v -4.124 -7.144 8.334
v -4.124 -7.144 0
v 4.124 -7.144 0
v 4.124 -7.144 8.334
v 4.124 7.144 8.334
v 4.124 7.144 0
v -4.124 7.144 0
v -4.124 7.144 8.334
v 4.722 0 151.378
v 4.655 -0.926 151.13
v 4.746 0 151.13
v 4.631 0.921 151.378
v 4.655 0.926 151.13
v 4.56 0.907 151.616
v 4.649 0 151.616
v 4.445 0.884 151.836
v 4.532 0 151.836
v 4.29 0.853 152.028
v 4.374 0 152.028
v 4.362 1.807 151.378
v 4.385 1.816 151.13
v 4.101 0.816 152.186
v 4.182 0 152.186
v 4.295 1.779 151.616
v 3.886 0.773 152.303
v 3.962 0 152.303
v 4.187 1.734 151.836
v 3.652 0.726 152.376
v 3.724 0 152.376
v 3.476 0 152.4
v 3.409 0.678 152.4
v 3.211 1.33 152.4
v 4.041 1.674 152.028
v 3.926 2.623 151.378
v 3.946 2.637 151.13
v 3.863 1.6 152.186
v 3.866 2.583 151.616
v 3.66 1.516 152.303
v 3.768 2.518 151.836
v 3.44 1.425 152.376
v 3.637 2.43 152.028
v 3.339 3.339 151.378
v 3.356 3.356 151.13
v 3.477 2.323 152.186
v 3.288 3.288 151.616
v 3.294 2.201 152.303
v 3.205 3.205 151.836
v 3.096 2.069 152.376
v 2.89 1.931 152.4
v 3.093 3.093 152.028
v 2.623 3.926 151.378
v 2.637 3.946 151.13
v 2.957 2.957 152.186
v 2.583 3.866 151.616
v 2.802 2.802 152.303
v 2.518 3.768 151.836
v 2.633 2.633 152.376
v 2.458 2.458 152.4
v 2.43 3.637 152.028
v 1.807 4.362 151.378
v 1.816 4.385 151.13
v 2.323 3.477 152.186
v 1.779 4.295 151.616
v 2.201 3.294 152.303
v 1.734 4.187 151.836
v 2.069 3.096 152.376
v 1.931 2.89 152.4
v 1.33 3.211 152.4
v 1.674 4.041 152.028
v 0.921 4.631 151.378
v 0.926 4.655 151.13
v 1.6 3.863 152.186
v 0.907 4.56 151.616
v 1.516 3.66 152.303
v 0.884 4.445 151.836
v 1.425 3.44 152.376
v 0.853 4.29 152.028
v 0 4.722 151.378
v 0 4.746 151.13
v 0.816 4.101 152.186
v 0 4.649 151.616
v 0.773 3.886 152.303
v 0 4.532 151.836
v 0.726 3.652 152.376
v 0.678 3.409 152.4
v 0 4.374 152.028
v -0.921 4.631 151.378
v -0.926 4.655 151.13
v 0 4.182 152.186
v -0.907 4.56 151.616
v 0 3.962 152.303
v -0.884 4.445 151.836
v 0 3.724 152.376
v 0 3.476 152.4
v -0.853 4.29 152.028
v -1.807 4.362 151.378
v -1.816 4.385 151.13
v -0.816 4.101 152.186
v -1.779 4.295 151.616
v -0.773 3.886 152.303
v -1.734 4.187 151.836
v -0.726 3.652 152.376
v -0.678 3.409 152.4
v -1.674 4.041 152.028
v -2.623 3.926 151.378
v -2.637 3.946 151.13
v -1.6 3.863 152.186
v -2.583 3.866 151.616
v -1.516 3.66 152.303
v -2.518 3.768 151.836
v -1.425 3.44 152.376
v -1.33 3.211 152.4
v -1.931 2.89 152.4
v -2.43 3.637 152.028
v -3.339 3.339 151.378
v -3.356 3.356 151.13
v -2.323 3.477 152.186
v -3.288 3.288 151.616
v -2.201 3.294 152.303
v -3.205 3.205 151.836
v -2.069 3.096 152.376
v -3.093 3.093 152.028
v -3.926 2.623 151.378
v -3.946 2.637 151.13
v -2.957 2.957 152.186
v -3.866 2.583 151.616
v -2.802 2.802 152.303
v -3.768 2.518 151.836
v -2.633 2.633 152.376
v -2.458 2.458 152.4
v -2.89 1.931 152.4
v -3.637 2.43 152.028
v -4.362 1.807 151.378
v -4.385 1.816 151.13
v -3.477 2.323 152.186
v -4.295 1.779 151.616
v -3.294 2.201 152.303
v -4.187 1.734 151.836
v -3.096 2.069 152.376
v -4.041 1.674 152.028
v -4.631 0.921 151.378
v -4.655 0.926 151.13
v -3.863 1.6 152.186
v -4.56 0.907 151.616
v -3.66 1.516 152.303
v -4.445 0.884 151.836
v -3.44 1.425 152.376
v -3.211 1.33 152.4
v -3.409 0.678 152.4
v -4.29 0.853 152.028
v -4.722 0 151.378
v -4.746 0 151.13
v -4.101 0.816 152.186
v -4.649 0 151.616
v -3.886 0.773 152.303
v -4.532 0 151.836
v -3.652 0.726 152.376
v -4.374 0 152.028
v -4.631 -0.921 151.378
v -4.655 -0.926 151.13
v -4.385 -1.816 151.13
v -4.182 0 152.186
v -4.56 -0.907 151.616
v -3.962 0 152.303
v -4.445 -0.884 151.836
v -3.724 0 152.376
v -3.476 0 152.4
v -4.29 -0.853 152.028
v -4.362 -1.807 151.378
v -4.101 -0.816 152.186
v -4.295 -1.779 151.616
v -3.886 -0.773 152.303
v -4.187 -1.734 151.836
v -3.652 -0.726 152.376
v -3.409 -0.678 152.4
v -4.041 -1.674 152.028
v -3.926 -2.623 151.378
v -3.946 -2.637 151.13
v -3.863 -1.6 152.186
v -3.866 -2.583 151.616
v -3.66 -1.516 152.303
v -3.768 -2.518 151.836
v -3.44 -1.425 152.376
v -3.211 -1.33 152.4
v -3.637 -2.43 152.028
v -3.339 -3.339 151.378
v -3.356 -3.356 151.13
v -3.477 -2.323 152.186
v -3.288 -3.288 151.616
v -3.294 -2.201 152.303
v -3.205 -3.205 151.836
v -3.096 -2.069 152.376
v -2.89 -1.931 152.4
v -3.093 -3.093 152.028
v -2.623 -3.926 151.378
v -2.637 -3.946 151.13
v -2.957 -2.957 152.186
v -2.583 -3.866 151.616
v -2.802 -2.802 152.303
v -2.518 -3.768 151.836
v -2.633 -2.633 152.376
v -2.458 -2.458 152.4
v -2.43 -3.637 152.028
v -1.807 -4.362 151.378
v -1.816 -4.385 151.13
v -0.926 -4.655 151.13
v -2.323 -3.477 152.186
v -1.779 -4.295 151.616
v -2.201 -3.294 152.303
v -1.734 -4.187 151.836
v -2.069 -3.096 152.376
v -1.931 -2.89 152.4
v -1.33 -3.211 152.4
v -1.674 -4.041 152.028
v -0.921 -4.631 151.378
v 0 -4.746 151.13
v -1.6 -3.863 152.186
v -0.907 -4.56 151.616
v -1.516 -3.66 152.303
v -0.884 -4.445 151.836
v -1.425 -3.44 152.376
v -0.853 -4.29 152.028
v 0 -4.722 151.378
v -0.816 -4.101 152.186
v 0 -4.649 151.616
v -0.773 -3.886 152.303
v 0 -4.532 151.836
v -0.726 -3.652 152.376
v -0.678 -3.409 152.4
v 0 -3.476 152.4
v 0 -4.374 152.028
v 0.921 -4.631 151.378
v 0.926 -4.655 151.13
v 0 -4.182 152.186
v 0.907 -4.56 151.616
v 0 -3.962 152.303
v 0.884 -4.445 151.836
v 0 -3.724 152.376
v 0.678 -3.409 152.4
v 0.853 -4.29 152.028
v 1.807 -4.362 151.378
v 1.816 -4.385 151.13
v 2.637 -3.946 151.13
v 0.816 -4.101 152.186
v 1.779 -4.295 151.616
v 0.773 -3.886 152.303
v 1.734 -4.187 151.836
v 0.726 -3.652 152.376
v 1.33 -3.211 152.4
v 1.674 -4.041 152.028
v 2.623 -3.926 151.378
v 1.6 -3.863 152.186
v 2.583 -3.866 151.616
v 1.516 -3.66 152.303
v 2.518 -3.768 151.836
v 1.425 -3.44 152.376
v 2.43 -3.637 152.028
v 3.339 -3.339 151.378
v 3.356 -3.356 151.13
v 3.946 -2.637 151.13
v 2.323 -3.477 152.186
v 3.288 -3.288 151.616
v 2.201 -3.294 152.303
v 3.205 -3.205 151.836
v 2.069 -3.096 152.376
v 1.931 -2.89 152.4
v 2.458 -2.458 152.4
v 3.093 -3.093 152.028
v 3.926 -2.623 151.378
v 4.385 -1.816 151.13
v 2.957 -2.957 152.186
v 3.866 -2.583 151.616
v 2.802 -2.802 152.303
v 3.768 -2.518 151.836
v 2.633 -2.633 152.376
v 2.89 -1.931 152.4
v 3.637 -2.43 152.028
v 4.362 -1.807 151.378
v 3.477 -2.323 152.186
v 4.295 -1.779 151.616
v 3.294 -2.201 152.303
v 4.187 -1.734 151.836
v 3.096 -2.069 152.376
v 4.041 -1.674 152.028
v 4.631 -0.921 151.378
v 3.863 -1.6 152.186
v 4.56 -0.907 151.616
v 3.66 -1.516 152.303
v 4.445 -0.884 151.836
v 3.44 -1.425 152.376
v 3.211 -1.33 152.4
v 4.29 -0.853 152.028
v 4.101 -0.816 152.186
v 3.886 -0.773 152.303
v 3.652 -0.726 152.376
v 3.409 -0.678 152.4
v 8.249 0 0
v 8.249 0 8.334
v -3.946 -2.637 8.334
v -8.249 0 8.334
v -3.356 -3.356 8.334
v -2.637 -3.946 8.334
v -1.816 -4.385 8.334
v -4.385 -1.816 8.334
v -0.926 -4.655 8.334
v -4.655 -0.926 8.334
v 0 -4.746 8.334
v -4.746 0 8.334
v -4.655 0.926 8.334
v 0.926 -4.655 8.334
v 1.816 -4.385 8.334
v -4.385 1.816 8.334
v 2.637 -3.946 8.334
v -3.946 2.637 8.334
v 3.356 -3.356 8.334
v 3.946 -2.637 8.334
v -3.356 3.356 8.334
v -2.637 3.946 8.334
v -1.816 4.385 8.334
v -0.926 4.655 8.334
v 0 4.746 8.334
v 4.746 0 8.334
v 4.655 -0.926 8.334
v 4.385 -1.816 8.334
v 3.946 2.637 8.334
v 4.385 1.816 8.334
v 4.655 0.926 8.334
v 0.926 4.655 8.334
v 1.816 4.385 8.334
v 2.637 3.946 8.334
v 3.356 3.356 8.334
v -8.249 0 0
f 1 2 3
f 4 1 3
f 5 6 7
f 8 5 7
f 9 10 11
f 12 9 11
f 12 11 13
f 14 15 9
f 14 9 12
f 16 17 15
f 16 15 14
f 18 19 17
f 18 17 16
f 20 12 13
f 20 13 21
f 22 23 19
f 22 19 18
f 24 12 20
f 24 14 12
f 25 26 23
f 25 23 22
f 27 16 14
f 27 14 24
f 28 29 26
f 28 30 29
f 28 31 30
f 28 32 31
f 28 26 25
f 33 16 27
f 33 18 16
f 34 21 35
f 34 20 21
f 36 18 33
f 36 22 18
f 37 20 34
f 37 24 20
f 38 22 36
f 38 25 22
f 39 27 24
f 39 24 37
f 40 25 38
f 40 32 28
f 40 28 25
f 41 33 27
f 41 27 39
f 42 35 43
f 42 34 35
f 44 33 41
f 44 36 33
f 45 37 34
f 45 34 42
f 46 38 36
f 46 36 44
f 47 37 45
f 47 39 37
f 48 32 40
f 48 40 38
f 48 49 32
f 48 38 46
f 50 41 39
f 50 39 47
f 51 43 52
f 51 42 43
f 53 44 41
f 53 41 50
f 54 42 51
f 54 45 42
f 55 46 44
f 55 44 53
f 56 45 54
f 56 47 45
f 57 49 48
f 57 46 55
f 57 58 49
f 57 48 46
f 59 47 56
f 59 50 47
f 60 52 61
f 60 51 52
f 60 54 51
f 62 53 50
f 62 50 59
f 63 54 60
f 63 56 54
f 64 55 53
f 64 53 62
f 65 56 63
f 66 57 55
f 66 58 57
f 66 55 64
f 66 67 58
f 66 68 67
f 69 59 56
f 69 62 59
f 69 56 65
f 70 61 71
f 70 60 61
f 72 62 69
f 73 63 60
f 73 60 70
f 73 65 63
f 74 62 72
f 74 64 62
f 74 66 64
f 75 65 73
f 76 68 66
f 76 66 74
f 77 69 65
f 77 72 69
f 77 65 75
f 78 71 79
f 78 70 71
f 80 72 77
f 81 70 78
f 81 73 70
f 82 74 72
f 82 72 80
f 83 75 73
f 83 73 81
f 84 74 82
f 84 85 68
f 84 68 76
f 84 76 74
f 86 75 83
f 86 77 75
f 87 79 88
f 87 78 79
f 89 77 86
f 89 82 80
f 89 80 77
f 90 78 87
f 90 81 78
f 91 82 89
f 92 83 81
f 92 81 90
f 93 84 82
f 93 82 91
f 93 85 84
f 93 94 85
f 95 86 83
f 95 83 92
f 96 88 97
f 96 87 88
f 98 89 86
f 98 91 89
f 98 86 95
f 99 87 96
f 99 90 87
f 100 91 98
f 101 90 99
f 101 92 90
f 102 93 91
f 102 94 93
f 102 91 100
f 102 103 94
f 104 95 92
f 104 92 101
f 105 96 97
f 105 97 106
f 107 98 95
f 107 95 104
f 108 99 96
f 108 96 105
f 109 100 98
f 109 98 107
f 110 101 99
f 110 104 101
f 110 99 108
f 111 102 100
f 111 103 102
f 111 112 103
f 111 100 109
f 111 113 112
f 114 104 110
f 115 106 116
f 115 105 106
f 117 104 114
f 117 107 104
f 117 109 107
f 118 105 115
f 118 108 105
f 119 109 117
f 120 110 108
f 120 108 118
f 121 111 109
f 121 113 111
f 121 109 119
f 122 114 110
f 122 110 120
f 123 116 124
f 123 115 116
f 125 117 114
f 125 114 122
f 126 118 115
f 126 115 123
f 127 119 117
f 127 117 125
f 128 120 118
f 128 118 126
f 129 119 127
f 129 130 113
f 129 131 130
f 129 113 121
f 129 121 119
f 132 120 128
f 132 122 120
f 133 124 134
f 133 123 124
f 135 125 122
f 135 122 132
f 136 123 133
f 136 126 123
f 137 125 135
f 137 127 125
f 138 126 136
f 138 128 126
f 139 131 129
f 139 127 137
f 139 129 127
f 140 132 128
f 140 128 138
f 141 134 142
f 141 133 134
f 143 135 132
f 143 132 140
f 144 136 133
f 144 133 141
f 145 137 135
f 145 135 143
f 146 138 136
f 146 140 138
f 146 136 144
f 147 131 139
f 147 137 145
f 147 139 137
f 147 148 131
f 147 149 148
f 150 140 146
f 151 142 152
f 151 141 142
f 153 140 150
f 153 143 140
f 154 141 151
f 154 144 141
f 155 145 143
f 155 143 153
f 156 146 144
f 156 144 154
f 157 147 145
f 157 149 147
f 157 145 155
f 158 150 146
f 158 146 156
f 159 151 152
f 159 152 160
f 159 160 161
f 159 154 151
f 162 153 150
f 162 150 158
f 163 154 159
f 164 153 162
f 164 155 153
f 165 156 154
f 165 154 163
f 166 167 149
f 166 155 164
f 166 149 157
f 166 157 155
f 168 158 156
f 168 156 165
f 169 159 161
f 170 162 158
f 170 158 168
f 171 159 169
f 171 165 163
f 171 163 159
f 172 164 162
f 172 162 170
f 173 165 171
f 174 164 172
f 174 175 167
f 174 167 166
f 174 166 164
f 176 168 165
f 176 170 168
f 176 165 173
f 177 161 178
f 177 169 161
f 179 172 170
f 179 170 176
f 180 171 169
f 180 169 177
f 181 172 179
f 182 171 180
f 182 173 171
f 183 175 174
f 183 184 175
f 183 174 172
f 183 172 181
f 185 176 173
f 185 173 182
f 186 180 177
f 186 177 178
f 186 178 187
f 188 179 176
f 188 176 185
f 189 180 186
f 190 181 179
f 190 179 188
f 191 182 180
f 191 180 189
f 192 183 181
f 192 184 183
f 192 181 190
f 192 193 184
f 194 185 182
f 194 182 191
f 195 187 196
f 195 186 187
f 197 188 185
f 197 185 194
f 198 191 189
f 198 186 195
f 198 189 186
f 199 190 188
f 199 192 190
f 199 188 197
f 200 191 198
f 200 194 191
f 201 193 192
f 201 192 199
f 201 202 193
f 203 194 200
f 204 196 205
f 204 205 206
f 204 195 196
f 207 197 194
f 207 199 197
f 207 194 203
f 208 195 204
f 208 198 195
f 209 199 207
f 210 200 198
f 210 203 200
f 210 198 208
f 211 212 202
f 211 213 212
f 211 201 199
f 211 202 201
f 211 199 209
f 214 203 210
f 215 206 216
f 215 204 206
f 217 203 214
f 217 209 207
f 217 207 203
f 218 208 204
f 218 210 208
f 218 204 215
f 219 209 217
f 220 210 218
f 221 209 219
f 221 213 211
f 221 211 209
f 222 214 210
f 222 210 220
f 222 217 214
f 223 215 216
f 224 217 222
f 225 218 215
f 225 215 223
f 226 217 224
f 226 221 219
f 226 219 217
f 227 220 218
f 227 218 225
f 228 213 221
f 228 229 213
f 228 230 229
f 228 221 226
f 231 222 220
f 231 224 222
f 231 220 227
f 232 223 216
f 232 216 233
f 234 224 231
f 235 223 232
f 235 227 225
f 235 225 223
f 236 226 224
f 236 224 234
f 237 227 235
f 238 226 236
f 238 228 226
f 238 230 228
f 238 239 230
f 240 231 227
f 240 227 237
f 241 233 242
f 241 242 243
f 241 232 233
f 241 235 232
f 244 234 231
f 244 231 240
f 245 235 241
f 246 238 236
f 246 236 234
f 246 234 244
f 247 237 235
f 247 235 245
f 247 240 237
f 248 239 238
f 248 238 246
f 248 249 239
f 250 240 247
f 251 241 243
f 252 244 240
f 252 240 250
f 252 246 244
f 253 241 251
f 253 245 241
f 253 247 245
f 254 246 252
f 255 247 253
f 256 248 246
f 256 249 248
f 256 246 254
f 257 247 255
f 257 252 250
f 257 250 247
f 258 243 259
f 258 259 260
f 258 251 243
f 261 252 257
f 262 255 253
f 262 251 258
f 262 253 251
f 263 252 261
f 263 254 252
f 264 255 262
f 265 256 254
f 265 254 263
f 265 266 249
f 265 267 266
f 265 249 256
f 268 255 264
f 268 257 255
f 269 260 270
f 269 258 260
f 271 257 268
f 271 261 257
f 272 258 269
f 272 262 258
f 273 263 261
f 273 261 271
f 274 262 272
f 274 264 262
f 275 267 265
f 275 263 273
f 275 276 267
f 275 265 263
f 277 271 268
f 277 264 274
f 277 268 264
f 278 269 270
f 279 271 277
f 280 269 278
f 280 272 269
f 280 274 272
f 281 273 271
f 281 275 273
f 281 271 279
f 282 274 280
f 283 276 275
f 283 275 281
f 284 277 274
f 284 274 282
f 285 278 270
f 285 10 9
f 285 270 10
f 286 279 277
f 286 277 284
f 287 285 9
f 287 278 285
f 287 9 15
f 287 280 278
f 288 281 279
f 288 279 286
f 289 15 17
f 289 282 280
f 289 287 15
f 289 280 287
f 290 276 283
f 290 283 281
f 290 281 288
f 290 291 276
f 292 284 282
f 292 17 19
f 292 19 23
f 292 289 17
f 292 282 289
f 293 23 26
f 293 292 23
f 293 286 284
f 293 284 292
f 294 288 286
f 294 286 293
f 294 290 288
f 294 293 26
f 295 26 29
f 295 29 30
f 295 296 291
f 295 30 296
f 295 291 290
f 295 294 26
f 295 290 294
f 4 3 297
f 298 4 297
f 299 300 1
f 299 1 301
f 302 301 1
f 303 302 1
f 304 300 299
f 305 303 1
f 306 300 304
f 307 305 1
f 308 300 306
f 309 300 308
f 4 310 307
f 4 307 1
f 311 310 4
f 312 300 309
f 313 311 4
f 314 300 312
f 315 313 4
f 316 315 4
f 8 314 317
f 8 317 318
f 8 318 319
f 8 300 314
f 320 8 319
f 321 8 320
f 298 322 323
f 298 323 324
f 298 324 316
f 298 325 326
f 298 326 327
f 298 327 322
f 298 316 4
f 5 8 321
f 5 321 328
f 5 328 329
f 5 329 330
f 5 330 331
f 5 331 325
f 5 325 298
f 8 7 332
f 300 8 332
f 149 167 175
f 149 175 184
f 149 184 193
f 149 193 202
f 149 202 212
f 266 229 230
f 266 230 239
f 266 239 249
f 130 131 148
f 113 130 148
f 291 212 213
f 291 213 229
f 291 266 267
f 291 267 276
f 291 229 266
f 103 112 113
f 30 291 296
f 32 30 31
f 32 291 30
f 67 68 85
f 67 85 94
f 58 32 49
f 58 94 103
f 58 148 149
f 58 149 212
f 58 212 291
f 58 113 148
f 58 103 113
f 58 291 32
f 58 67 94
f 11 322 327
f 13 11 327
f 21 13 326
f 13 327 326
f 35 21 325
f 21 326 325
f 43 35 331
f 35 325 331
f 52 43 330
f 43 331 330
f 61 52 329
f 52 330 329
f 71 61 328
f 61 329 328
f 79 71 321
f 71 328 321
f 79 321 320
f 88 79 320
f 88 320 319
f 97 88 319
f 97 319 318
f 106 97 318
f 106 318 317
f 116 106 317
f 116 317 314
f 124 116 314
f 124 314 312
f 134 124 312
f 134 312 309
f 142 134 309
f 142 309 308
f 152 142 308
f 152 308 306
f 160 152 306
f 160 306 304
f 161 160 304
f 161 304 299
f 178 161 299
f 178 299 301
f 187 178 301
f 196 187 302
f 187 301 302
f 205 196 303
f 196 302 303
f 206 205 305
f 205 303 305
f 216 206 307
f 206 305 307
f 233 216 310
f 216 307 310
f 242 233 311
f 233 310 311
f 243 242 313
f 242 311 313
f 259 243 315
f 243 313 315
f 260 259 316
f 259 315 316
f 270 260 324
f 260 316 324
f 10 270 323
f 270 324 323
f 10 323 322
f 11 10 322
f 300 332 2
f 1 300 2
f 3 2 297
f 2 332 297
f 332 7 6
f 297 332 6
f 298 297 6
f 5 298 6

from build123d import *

# Parameters (mm, degrees)
F0_R     = 4.74599
F1_DEPTH = 152.4
F3_DEPTH = 8.334375
F4_R     = 1.27


# Not quite as in the source:
# - a length typed as a fraction of an inch, garbled in the dataset ("3 / 203.2 mm" for 3/8 in), is restored


with BuildPart() as f1:
    # F0 (on Top) → F1 (new body)
    with BuildSketch(Plane.XY):
        Circle(F0_R)
    extrude(amount=F1_DEPTH)

    # F2 (on Top) → F3 (join)
    with BuildSketch(Plane.XY):
        Polygon((-4.1244459855, -7.14375), (4.1244459855, -7.14375), (8.248891971, 0), (4.1244459855, 7.14375), (-4.1244459855, 7.14375), (-8.248891971, 0), align=None)
    extrude(amount=F3_DEPTH)

    # F4
    f4_edges = [f1.edges().sort_by_distance(p)[0] for p in [
        (-4.74599, 0, 152.4),
    ]]
    fillet(f4_edges, radius=F4_R)


solid = f1.part
